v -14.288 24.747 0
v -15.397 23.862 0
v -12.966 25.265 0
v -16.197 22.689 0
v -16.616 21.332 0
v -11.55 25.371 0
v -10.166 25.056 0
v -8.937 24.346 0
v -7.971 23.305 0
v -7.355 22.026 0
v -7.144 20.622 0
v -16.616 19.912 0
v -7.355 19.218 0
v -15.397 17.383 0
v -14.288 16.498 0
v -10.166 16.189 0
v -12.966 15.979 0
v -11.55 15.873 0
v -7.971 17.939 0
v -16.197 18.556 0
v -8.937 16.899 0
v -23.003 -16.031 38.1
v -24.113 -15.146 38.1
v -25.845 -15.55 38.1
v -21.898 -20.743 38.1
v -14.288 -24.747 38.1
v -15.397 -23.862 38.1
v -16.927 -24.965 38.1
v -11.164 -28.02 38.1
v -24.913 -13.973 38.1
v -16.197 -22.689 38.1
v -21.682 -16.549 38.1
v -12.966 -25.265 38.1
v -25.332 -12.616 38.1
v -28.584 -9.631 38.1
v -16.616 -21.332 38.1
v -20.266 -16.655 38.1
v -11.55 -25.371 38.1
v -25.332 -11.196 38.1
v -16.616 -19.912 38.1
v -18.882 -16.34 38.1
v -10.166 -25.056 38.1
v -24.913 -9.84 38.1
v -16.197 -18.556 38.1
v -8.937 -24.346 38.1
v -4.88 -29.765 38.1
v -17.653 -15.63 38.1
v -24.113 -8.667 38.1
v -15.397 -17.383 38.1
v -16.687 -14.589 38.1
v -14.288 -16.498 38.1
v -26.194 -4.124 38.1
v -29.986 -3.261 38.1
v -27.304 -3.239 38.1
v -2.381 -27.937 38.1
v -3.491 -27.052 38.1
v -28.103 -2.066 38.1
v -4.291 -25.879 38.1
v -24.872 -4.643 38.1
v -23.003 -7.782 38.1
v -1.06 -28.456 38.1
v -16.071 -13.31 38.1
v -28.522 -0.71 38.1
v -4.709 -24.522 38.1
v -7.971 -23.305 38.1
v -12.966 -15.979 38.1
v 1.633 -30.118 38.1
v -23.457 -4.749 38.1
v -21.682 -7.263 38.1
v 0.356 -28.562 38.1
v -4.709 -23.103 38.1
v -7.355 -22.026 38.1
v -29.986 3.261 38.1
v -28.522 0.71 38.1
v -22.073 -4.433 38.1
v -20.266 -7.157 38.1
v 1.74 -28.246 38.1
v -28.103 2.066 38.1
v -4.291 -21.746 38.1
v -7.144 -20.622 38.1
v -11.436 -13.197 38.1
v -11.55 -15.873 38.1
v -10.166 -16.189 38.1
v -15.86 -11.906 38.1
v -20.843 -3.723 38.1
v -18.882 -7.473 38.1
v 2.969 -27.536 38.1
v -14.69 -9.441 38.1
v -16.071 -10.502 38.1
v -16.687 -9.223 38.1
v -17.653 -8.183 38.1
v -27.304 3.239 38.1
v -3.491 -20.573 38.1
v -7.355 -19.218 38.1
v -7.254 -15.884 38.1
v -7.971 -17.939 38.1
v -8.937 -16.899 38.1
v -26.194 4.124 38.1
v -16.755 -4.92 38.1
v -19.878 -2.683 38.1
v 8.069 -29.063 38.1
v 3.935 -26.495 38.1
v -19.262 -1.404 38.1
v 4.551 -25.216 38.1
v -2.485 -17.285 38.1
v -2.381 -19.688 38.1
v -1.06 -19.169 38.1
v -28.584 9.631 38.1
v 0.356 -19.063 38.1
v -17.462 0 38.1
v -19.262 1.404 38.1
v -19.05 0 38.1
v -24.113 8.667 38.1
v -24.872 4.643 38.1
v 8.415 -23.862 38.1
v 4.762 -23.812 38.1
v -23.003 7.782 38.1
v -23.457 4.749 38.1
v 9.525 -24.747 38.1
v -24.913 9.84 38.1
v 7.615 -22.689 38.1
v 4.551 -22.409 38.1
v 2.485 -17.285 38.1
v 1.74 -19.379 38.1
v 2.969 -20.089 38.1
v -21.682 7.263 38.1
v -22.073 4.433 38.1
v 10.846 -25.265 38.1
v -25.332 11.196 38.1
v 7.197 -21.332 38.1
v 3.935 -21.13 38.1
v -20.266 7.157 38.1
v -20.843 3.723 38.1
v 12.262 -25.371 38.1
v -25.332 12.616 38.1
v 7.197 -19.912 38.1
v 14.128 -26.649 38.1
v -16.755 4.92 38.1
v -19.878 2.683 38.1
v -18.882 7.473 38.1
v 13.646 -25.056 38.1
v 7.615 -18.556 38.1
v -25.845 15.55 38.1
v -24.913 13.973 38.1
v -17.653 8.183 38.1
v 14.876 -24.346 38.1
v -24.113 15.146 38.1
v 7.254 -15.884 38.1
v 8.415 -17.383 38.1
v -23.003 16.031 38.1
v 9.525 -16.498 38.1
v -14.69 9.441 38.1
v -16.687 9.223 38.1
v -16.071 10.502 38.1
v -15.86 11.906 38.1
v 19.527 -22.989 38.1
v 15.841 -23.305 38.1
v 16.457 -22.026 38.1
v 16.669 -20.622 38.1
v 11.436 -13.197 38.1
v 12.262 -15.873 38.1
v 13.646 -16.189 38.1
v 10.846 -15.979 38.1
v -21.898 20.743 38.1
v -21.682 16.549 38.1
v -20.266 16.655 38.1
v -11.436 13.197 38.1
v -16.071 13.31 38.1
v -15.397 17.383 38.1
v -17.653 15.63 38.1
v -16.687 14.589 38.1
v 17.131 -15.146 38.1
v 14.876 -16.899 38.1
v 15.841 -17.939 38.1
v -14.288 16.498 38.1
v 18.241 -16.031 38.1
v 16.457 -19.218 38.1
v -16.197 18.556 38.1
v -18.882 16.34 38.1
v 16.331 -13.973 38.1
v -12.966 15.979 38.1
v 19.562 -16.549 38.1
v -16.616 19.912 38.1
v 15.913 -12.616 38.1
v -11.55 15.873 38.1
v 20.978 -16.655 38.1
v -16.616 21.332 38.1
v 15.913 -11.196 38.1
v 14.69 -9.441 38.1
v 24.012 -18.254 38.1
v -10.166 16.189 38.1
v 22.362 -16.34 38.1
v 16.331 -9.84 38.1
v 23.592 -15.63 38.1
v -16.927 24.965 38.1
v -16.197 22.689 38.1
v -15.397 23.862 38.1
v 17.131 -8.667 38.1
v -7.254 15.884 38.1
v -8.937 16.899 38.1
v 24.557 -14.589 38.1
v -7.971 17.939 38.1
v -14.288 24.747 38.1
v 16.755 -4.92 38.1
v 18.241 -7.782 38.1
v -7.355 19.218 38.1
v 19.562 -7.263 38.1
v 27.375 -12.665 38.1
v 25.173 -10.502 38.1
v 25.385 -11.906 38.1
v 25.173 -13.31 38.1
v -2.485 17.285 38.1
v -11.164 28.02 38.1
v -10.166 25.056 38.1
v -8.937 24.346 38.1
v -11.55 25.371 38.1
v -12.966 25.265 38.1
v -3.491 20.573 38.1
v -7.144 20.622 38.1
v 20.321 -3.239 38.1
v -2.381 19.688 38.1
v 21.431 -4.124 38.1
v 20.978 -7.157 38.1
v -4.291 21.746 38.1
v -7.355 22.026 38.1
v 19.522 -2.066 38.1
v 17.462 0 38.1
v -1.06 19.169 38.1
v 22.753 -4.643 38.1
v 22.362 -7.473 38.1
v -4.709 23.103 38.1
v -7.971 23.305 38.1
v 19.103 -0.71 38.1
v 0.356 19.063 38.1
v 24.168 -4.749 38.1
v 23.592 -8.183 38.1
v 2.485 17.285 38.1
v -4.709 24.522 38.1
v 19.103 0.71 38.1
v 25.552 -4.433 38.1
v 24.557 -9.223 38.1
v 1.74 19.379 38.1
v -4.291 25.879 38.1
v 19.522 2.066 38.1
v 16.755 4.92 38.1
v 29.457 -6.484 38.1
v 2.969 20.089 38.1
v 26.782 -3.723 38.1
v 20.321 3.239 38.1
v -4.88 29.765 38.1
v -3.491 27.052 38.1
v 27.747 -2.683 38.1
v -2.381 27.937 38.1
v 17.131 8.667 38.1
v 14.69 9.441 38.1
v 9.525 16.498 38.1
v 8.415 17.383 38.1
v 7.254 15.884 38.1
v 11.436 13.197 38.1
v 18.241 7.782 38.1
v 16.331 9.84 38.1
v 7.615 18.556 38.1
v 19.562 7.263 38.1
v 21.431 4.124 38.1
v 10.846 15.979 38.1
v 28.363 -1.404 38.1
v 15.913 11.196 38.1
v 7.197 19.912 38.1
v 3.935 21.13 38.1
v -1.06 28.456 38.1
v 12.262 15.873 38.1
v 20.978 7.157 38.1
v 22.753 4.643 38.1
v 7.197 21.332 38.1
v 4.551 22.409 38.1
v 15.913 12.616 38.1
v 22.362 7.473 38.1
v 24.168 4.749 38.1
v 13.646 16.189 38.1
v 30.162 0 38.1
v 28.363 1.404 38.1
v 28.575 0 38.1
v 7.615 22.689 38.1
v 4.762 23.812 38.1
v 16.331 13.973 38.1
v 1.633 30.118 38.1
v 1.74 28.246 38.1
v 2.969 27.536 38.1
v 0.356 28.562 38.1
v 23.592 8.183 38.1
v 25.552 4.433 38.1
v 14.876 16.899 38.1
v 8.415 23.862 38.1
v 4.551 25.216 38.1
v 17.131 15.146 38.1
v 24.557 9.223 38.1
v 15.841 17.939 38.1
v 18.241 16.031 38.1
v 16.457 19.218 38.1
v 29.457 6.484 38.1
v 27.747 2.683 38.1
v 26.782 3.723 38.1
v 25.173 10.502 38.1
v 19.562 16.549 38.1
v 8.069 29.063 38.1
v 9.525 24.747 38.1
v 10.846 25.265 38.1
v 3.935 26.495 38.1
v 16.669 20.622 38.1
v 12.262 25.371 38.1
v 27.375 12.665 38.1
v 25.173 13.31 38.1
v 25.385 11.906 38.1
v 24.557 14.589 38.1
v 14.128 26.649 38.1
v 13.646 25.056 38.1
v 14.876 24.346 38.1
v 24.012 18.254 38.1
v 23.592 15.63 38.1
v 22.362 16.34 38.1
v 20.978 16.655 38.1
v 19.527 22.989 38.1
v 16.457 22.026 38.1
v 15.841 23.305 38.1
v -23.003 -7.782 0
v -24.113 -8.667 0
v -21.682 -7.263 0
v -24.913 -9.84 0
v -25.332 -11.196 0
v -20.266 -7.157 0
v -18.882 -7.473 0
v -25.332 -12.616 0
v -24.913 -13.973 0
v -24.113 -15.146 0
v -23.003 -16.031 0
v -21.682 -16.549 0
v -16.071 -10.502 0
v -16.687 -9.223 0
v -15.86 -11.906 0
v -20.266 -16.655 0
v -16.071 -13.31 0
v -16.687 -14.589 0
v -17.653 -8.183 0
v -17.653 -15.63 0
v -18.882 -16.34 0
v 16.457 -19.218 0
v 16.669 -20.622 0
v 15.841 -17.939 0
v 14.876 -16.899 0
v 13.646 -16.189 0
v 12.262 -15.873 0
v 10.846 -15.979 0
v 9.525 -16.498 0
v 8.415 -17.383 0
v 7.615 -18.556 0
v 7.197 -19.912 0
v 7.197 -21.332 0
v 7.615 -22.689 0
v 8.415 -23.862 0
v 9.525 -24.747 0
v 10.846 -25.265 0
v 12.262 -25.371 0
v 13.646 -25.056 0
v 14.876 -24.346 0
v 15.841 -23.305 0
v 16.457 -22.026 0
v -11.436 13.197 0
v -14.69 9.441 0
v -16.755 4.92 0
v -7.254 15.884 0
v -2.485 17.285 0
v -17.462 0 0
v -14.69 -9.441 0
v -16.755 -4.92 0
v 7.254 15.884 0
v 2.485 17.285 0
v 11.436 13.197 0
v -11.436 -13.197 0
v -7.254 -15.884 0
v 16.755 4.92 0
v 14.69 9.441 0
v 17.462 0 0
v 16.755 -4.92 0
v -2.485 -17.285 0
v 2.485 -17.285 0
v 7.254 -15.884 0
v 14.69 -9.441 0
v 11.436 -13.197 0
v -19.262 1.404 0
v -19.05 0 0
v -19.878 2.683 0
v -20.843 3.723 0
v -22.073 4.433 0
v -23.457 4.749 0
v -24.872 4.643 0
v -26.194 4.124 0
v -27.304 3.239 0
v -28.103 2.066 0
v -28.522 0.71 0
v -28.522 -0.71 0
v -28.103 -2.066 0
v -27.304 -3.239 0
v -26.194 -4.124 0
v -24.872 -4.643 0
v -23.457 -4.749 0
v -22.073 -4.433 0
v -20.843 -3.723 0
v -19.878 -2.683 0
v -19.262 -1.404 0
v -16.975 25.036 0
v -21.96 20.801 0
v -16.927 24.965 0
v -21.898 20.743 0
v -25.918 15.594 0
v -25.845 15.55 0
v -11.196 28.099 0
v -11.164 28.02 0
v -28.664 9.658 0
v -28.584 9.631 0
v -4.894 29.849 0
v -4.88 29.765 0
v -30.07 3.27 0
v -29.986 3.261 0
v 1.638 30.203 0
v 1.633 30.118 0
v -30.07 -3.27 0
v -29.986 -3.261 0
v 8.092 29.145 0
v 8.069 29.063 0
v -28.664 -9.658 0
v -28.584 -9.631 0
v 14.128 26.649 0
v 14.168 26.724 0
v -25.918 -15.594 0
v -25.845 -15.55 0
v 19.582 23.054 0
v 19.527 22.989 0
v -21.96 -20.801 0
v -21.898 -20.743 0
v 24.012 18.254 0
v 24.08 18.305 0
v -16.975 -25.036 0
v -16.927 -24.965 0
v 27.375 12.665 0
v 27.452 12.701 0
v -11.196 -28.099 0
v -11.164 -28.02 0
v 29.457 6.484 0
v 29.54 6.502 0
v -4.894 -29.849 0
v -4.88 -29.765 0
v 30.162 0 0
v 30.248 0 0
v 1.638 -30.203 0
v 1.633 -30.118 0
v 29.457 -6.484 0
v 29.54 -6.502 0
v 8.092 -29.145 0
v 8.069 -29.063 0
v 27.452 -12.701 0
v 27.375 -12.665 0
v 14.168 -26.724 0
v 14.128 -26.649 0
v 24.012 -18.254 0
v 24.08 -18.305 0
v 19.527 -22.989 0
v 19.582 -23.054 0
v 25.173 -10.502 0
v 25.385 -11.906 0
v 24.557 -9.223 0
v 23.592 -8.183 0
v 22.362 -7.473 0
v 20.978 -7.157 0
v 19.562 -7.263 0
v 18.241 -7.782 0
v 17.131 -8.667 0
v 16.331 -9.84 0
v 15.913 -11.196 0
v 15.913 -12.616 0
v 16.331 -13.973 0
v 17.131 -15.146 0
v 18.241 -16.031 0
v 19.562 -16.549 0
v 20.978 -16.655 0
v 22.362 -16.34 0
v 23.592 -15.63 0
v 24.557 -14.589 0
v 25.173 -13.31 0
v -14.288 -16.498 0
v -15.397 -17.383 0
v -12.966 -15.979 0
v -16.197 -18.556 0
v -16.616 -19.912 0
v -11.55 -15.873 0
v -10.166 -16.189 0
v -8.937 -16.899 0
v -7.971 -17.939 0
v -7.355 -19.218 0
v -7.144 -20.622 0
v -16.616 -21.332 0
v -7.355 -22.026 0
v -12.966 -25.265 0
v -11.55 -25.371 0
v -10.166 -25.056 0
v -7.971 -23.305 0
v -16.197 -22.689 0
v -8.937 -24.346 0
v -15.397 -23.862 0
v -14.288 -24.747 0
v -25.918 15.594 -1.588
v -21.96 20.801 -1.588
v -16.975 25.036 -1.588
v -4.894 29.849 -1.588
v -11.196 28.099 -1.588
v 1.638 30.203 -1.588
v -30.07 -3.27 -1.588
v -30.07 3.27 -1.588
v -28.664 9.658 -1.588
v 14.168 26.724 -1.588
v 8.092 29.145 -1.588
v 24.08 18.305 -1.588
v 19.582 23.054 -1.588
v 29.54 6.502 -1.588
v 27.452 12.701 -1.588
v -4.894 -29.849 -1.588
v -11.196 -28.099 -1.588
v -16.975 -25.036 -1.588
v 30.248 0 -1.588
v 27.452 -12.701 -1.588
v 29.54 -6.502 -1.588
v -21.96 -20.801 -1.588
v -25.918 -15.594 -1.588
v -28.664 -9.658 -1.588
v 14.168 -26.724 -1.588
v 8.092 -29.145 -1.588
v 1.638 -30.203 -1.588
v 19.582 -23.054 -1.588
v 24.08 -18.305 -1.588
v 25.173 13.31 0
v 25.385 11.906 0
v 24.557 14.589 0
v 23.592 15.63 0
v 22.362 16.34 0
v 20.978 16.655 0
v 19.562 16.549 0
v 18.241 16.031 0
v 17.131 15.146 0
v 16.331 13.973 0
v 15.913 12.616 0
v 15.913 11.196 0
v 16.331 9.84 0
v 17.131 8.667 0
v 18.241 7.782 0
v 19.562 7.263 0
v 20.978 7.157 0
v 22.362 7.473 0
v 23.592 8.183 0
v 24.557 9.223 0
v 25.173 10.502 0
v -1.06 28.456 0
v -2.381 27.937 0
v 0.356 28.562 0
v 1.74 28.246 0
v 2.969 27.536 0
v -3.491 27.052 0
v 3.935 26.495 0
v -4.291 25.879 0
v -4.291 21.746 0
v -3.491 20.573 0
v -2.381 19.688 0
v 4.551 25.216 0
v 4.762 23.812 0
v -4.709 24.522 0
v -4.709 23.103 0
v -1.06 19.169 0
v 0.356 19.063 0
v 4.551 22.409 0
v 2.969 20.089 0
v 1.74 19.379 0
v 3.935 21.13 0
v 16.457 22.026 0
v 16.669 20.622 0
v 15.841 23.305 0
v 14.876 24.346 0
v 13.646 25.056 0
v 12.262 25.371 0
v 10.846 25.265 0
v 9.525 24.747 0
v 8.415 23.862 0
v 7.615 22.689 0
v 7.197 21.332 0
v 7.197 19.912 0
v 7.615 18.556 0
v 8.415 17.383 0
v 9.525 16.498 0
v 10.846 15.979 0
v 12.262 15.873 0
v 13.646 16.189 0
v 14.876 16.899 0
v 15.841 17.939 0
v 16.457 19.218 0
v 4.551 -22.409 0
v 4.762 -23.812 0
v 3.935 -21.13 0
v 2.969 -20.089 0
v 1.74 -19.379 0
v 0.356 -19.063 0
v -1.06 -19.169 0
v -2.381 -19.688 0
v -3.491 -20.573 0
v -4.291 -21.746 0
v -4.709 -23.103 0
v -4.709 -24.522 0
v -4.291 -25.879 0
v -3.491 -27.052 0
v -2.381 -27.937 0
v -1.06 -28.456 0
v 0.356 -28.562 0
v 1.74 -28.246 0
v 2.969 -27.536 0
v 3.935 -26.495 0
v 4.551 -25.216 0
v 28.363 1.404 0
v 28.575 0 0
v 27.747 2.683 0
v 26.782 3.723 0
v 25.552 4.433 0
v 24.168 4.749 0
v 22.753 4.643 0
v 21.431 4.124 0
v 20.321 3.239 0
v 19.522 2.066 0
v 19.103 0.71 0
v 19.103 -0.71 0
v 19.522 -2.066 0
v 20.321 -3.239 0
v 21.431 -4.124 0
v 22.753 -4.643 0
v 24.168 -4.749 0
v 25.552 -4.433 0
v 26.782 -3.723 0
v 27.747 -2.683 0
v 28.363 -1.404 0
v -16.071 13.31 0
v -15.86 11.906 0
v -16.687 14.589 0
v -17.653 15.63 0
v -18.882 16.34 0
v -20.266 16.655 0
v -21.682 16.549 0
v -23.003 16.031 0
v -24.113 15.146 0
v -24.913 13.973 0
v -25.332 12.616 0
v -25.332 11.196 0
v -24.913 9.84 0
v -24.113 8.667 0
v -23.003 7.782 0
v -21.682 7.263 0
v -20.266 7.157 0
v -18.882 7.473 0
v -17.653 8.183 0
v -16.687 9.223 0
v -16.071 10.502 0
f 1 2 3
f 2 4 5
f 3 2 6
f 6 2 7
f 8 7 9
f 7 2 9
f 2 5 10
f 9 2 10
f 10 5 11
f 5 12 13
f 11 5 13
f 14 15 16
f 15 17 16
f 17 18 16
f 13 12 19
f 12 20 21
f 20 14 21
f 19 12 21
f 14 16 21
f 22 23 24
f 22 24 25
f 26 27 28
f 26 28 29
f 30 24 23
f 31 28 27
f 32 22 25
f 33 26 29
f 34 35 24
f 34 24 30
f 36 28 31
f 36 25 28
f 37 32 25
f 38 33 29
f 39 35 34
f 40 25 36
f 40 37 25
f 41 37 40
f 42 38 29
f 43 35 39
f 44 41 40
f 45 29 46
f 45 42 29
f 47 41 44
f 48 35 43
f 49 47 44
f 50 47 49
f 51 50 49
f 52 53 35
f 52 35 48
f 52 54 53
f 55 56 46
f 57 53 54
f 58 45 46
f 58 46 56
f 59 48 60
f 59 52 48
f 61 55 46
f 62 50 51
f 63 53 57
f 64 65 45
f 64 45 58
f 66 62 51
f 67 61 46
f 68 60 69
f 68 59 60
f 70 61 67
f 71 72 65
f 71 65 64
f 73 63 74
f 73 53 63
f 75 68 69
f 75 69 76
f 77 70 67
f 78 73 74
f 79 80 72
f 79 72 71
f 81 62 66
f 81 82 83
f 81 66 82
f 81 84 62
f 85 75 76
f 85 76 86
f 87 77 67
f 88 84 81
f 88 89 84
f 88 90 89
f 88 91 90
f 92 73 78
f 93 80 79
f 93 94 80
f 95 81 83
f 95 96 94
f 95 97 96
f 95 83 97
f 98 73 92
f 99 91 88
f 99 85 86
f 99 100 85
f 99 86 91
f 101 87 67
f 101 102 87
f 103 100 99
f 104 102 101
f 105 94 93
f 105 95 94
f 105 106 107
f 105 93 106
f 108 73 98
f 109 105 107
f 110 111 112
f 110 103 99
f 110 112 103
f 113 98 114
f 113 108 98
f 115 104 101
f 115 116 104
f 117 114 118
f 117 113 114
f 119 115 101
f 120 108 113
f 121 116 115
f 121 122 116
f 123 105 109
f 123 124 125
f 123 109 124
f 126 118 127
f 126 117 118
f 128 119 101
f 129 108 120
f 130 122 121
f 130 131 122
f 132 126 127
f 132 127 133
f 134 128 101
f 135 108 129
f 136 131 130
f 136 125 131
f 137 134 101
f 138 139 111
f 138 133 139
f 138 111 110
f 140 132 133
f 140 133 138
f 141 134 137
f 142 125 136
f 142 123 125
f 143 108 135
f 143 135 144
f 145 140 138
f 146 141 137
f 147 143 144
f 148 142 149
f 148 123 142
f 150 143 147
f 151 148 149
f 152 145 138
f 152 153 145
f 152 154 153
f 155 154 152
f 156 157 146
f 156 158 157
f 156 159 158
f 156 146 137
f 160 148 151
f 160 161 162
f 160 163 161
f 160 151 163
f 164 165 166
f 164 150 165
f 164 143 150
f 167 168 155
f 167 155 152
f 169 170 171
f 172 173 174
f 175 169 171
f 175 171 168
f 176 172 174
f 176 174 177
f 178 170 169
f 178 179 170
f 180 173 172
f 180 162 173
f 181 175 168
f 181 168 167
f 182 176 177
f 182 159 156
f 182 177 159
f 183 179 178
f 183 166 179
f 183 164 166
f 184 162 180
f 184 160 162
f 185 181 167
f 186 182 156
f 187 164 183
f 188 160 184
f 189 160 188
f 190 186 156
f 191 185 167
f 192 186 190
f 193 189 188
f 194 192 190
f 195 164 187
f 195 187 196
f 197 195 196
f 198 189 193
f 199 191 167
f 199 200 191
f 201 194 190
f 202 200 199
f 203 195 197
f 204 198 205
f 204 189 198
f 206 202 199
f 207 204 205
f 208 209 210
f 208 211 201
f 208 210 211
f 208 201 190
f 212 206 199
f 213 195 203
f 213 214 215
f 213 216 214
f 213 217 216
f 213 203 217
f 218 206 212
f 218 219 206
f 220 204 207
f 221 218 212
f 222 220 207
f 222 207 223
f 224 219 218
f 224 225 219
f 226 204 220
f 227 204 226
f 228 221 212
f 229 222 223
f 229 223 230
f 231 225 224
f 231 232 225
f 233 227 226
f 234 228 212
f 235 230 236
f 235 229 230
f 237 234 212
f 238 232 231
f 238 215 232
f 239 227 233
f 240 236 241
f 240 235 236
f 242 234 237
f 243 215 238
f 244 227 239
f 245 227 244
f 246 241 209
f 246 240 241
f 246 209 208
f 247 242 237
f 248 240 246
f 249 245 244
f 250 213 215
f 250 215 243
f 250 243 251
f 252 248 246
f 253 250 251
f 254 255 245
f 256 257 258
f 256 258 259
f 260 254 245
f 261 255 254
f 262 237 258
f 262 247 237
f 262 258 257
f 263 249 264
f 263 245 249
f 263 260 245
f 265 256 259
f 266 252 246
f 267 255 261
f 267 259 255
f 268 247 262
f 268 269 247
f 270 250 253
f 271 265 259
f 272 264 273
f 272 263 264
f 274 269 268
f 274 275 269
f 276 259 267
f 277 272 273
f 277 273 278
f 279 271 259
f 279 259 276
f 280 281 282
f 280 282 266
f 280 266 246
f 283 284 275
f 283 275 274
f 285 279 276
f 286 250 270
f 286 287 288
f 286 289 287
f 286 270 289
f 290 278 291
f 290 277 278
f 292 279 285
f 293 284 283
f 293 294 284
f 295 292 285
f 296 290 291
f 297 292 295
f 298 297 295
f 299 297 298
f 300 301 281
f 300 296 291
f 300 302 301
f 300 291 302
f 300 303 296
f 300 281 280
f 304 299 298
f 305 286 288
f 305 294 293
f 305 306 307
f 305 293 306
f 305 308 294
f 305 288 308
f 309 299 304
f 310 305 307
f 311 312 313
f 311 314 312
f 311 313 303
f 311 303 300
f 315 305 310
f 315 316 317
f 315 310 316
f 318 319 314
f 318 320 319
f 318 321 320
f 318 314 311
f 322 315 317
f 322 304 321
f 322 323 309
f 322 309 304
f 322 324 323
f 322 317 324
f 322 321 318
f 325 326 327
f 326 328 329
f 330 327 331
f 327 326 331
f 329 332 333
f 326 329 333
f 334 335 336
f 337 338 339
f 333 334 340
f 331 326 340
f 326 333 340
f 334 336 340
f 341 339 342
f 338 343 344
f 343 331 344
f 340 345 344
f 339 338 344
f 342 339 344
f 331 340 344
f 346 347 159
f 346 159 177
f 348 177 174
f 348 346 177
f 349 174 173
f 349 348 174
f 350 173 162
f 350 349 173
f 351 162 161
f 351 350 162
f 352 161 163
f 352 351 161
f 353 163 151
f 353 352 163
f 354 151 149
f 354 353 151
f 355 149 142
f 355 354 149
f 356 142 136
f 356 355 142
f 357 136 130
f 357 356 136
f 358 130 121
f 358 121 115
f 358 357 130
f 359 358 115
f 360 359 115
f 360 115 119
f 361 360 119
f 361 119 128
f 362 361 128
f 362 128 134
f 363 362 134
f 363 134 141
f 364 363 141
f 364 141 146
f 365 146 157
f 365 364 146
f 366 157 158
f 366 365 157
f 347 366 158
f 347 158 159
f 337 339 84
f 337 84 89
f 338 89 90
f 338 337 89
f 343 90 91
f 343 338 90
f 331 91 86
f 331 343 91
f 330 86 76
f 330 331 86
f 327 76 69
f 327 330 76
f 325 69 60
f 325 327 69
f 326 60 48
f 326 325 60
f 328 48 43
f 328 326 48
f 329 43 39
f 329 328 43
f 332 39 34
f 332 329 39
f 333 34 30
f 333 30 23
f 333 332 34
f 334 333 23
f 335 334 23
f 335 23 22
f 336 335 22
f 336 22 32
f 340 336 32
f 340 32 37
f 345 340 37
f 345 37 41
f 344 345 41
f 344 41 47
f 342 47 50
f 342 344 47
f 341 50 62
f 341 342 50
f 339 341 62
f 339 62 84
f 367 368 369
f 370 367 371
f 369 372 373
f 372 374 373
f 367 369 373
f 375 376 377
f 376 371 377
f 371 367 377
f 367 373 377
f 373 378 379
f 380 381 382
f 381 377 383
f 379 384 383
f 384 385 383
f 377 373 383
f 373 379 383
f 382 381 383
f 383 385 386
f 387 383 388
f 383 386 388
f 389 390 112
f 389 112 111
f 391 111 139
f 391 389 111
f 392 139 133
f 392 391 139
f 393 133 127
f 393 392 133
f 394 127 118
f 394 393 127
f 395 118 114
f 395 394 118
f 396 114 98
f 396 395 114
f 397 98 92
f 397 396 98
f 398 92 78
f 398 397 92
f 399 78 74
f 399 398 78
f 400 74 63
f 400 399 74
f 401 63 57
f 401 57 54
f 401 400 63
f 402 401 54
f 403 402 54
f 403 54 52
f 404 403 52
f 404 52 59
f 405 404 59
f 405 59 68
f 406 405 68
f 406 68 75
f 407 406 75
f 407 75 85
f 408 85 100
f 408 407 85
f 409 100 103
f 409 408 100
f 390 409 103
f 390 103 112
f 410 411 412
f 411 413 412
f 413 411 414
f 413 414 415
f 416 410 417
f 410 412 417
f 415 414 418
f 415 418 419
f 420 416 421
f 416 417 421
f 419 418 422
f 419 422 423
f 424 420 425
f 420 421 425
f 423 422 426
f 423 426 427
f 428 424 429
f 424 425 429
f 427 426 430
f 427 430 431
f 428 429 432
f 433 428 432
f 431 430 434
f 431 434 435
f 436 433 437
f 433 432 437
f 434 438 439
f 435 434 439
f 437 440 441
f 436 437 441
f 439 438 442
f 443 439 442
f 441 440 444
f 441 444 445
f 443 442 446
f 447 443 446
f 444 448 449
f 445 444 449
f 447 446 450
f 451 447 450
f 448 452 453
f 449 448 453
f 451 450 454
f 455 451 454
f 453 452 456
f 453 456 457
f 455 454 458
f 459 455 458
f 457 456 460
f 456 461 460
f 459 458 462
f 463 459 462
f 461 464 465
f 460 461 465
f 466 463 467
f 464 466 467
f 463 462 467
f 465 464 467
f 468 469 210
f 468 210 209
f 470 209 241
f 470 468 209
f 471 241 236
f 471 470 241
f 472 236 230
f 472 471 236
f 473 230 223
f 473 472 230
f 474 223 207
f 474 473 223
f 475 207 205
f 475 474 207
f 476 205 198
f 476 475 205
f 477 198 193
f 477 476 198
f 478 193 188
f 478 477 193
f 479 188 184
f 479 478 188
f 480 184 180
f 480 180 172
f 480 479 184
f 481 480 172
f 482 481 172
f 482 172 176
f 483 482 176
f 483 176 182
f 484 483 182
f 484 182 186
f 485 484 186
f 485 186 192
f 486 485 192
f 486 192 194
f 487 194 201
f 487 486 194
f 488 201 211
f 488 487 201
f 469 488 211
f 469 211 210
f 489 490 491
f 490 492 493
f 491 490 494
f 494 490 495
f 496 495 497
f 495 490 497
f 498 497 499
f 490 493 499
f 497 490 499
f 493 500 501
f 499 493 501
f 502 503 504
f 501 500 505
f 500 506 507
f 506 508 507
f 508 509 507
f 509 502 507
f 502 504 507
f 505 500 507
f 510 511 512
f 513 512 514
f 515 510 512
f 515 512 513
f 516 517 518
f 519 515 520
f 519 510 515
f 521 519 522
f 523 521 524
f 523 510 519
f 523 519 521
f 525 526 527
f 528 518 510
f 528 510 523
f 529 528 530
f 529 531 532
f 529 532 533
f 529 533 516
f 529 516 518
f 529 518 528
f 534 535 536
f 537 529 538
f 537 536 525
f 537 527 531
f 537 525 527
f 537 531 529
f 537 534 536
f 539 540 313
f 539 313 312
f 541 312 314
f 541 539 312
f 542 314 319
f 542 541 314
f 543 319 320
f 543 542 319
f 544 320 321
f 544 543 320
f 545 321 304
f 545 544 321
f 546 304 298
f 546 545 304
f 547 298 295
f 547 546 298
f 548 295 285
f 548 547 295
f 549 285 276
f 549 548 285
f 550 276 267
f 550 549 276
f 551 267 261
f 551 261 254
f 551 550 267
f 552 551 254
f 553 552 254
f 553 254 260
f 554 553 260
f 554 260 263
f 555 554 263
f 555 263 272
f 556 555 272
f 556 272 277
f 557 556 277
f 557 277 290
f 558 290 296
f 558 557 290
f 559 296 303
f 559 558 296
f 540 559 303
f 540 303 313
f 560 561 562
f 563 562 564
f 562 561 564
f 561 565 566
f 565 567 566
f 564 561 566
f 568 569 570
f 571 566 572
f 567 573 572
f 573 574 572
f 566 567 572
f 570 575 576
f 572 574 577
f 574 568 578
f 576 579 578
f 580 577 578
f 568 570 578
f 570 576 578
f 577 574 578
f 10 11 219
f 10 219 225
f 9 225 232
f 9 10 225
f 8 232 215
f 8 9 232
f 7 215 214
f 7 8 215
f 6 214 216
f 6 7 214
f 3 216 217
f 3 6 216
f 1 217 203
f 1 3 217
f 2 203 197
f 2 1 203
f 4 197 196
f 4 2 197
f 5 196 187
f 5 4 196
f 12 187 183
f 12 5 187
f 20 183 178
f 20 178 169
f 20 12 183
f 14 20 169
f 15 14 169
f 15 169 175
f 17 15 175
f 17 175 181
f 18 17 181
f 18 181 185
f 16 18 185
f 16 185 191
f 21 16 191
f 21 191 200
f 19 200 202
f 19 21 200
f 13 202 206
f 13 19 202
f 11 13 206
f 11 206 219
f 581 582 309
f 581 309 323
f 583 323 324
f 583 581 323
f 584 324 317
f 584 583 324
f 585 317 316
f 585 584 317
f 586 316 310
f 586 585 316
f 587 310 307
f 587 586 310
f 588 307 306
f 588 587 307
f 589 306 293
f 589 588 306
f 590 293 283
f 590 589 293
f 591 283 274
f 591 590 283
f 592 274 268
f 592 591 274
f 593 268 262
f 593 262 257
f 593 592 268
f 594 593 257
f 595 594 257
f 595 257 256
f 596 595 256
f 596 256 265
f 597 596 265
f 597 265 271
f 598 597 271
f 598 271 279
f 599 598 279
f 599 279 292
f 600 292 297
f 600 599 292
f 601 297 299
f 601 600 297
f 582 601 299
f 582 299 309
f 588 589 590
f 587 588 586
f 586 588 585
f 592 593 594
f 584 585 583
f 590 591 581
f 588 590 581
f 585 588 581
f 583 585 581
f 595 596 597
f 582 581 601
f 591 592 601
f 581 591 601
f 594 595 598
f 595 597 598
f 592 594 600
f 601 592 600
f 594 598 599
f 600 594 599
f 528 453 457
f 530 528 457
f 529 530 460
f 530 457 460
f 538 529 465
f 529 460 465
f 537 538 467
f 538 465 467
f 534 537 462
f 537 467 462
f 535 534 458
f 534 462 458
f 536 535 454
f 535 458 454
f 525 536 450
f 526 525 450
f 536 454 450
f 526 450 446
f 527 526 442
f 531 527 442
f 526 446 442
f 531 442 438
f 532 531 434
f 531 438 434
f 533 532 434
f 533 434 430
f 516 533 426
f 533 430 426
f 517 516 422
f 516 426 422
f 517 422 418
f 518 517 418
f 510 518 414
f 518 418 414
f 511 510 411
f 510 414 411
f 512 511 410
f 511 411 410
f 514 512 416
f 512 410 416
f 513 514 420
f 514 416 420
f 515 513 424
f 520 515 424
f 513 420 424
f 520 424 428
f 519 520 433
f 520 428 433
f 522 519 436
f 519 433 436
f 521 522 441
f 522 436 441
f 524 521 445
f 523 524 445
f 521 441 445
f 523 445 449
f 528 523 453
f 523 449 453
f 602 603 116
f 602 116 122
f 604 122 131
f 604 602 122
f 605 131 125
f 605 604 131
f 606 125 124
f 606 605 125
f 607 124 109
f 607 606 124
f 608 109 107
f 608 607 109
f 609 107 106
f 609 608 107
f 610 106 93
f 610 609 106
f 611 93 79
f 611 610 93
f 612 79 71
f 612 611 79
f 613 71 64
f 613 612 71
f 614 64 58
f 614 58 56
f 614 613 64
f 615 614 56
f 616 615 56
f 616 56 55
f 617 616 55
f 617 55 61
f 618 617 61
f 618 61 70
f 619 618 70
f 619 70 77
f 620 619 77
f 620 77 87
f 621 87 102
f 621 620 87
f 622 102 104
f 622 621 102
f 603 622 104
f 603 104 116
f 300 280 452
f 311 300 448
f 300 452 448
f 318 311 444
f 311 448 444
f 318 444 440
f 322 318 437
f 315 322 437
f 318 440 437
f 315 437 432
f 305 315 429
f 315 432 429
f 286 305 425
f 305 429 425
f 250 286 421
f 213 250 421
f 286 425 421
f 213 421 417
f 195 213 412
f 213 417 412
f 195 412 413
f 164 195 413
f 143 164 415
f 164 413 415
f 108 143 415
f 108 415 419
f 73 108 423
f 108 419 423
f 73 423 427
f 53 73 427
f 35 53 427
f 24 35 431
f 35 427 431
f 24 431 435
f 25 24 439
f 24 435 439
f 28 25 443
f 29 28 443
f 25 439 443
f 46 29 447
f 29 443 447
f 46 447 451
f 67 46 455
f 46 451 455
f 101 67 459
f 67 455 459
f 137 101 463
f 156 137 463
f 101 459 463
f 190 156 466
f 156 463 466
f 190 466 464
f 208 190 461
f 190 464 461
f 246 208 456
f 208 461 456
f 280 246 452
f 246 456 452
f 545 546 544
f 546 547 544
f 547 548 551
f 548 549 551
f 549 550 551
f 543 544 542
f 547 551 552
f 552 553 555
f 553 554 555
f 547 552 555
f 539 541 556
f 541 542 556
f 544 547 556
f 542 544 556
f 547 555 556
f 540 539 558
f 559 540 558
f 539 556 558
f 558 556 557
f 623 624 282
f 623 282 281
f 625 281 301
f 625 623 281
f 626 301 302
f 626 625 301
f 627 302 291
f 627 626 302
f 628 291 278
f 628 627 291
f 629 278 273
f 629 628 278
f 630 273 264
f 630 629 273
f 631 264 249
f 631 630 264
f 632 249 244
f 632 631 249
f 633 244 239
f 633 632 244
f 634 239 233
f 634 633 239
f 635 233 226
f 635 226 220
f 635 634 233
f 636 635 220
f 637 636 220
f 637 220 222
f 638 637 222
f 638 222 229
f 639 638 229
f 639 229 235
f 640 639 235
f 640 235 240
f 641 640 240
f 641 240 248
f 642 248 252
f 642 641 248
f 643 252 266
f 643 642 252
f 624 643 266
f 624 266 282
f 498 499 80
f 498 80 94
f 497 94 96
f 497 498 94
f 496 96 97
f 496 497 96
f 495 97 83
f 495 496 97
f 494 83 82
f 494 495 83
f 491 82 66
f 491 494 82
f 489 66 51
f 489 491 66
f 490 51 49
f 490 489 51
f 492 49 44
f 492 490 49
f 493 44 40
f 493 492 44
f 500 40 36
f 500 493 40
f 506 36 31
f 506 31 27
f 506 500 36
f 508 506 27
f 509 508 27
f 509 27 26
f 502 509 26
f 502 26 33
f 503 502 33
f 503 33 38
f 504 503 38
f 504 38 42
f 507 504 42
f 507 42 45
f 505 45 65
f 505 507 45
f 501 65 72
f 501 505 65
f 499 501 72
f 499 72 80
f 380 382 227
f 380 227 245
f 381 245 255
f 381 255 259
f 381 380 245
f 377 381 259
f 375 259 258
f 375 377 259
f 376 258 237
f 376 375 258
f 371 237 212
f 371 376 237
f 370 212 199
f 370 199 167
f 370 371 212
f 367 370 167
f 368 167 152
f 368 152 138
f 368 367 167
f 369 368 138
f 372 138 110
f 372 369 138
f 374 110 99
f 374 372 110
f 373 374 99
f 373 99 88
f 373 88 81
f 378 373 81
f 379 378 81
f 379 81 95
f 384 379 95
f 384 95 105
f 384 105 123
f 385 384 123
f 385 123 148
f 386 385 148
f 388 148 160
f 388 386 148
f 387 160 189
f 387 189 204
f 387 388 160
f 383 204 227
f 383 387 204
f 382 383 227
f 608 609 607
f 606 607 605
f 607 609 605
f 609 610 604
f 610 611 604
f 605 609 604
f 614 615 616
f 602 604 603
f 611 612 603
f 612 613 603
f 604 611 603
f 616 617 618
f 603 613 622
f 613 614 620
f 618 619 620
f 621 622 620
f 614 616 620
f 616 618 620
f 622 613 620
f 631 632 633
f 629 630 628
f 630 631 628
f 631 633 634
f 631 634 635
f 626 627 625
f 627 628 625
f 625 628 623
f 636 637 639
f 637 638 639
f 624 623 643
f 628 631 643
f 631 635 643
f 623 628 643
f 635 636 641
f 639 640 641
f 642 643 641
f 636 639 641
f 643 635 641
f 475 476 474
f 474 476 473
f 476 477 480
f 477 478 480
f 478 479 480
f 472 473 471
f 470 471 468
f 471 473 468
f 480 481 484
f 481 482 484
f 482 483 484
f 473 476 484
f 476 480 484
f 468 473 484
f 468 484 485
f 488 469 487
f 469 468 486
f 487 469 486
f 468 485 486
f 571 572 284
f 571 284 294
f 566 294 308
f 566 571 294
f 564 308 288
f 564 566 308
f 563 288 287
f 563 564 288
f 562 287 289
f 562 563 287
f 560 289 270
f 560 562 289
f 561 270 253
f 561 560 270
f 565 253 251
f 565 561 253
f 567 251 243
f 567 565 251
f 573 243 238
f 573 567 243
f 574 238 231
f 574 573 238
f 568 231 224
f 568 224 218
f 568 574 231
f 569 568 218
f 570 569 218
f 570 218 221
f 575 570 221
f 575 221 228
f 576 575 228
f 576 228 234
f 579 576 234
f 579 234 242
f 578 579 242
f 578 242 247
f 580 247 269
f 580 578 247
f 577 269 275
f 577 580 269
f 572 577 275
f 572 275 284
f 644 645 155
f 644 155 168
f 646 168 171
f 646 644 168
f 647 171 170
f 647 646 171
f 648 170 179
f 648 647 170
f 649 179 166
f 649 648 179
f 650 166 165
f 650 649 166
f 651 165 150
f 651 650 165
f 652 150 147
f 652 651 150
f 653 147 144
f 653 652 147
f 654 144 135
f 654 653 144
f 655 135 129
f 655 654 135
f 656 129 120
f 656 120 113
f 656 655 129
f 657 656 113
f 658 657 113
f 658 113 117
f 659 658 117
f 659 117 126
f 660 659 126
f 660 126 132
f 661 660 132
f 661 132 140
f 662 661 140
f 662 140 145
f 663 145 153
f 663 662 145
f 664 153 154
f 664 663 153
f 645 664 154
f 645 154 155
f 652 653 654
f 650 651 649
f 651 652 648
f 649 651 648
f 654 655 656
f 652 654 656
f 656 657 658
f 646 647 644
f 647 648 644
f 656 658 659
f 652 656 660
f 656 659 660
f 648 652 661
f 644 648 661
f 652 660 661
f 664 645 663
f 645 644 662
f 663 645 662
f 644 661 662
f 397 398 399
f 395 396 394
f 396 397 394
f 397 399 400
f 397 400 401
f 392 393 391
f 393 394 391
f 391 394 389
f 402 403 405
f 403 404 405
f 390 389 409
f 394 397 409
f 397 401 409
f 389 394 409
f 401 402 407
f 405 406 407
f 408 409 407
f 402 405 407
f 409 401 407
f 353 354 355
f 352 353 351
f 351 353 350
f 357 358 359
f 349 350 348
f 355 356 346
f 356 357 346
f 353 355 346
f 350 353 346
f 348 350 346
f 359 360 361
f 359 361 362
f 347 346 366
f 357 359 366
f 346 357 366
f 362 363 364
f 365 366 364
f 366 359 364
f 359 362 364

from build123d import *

# Parameters (mm, degrees)
F0_R     = 30.1625
F0_R_2   = 4.7625
F0_R_3   = 17.4625
F1_DEPTH = 38.1
F2_R     = 30.2476554836
F3_DEPTH = 1.5875


with BuildPart() as f1:
    # F0 (on Top) → F1 (new body)
    with BuildSketch(Plane.XY):
        Circle(F0_R)
        with Locations((-11.90625, -20.6222299276)):
            Circle(F0_R_2, mode=Mode.SUBTRACT)
        with Locations((-20.6222299276, -11.90625)):
            Circle(F0_R_2, mode=Mode.SUBTRACT)
        with Locations((0, -23.8125)):
            Circle(F0_R_2, mode=Mode.SUBTRACT)
        with Locations((11.90625, -20.6222299276)):
            Circle(F0_R_2, mode=Mode.SUBTRACT)
        with Locations((20.6222299276, -11.90625)):
            Circle(F0_R_2, mode=Mode.SUBTRACT)
        with Locations((-23.8125, 0)):
            Circle(F0_R_2, mode=Mode.SUBTRACT)
        with Locations((-20.6222299276, 11.90625)):
            Circle(F0_R_2, mode=Mode.SUBTRACT)
        with Locations((-11.90625, 20.6222299276)):
            Circle(F0_R_2, mode=Mode.SUBTRACT)
        Circle(F0_R_3, mode=Mode.SUBTRACT)
        with Locations((23.8125, 0)):
            Circle(F0_R_2, mode=Mode.SUBTRACT)
        with Locations((20.6222299276, 11.90625)):
            Circle(F0_R_2, mode=Mode.SUBTRACT)
        with Locations((11.90625, 20.6222299276)):
            Circle(F0_R_2, mode=Mode.SUBTRACT)
        with Locations((0, 23.8125)):
            Circle(F0_R_2, mode=Mode.SUBTRACT)
    extrude(amount=F1_DEPTH)

    # F2 (on face) → F3 (join)
    with BuildSketch(Plane(origin=(0, 0, 0), x_dir=(1, 0, 0), z_dir=(0, 0, -1))):
        Circle(F2_R)
    extrude(amount=F3_DEPTH)


solid = f1.part
